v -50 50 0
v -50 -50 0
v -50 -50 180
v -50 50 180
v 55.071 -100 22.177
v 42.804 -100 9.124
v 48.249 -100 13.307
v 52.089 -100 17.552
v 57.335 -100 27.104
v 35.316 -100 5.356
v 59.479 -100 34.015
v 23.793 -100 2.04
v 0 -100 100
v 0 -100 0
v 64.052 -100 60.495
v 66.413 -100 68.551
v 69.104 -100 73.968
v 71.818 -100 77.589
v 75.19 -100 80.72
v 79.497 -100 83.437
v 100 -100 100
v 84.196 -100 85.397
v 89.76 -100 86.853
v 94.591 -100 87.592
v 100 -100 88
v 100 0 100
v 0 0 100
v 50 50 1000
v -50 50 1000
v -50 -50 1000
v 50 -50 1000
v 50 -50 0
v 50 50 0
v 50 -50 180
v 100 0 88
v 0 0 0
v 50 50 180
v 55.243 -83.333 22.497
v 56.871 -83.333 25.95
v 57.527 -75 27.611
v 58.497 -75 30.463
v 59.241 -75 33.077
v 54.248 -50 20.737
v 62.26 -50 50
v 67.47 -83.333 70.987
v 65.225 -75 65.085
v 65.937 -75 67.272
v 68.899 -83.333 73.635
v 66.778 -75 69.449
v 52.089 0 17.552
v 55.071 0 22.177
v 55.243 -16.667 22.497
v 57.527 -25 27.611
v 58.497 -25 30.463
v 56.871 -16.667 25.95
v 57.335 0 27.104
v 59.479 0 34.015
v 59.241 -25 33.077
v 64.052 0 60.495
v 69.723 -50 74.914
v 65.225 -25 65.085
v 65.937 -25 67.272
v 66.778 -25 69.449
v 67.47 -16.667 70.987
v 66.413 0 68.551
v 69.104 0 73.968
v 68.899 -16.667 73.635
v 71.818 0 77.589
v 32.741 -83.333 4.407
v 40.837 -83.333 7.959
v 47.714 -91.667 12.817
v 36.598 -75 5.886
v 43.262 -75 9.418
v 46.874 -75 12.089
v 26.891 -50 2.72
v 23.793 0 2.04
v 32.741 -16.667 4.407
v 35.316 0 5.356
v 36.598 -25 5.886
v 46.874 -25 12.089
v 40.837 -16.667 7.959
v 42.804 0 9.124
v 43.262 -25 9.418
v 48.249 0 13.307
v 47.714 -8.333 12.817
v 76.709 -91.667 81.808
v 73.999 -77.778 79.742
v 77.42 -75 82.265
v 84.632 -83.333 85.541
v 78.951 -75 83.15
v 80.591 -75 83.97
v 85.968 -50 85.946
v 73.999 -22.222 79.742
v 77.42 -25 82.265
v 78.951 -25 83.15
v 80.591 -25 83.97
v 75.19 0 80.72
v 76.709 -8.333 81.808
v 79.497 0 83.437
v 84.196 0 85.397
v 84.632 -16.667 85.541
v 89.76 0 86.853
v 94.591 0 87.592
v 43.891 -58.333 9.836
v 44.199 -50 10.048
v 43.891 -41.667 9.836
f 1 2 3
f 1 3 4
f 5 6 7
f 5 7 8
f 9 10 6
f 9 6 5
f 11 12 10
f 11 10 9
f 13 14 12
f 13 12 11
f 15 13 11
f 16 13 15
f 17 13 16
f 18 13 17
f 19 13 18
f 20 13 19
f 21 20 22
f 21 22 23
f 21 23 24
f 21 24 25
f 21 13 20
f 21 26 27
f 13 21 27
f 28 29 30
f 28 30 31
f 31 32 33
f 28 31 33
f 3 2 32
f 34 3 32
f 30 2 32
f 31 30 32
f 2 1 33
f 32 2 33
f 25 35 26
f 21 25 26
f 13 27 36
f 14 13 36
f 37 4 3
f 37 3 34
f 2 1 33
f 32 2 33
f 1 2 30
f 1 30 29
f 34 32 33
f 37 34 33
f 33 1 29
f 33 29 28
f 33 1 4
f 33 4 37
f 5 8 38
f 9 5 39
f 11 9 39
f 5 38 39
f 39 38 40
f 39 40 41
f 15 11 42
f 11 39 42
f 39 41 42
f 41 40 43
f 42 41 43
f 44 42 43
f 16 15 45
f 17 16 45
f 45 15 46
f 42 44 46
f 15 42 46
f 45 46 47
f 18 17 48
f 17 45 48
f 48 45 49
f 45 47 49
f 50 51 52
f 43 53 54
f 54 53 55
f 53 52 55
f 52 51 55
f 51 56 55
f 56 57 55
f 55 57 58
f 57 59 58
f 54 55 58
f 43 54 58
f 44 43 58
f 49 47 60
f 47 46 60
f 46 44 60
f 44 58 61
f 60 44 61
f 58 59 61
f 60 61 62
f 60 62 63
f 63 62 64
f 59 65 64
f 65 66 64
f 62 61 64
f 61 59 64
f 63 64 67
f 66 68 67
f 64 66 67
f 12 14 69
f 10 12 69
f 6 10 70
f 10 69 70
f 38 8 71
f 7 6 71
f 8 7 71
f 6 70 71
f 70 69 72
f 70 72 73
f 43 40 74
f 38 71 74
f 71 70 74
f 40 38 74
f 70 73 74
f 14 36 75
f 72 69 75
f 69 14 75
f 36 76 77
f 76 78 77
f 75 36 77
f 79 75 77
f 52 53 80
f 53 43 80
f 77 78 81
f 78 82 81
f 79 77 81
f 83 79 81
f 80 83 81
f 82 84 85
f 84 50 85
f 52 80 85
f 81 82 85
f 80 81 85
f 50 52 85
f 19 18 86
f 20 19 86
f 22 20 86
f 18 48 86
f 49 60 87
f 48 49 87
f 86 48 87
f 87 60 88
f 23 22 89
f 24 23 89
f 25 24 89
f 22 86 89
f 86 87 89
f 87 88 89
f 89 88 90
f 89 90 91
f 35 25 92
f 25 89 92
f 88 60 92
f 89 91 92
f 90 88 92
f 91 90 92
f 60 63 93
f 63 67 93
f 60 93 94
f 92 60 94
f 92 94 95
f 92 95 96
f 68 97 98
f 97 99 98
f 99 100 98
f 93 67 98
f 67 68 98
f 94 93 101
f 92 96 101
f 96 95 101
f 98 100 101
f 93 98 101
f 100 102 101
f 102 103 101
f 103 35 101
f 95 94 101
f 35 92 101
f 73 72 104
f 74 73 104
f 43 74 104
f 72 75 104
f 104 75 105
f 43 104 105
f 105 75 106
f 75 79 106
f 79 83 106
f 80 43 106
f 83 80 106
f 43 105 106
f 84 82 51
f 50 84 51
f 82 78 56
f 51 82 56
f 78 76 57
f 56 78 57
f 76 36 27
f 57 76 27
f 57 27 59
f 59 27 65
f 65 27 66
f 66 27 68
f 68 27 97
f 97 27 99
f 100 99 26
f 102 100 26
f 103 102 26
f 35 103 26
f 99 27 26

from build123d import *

# Parameters (mm, degrees)
F0_W     = 100
F0_H     = 100
F1_DEPTH = 1000
F2_DEPTH = 180
F4_DEPTH = 100


with BuildPart() as f1:
    # F0 (on Top) → F1 (new body)
    with BuildSketch(Plane.XY):
        Rectangle(F0_W, F0_H)
    extrude(amount=F1_DEPTH)


with BuildPart() as f2:
    # F0 (on Top) → F2 (new body)
    with BuildSketch(Plane.XY):
        Rectangle(F0_W, F0_H)
    extrude(amount=F2_DEPTH)


with BuildPart() as f4:
    # F3 (on Front) → F4 (new body)
    with BuildSketch(Plane.XZ):
        with BuildLine():
            Line((0, 100), (0, 0))
            add(Edge.make_bspline(
                [(0, 0), (56.3044250011, 0), (60.9587058973, 48.071970967), (68.3856010437, 86.6930186749), (100, 88)],
                knots=[0, 0, 0, 0, 0.5497636882, 1, 1, 1, 1], degree=3))
            Line((100, 88), (100, 100))
            Line((100, 100), (0, 100))
        make_face()
    extrude(amount=F4_DEPTH)


solid = Compound([f1.part, f2.part, f4.part])
